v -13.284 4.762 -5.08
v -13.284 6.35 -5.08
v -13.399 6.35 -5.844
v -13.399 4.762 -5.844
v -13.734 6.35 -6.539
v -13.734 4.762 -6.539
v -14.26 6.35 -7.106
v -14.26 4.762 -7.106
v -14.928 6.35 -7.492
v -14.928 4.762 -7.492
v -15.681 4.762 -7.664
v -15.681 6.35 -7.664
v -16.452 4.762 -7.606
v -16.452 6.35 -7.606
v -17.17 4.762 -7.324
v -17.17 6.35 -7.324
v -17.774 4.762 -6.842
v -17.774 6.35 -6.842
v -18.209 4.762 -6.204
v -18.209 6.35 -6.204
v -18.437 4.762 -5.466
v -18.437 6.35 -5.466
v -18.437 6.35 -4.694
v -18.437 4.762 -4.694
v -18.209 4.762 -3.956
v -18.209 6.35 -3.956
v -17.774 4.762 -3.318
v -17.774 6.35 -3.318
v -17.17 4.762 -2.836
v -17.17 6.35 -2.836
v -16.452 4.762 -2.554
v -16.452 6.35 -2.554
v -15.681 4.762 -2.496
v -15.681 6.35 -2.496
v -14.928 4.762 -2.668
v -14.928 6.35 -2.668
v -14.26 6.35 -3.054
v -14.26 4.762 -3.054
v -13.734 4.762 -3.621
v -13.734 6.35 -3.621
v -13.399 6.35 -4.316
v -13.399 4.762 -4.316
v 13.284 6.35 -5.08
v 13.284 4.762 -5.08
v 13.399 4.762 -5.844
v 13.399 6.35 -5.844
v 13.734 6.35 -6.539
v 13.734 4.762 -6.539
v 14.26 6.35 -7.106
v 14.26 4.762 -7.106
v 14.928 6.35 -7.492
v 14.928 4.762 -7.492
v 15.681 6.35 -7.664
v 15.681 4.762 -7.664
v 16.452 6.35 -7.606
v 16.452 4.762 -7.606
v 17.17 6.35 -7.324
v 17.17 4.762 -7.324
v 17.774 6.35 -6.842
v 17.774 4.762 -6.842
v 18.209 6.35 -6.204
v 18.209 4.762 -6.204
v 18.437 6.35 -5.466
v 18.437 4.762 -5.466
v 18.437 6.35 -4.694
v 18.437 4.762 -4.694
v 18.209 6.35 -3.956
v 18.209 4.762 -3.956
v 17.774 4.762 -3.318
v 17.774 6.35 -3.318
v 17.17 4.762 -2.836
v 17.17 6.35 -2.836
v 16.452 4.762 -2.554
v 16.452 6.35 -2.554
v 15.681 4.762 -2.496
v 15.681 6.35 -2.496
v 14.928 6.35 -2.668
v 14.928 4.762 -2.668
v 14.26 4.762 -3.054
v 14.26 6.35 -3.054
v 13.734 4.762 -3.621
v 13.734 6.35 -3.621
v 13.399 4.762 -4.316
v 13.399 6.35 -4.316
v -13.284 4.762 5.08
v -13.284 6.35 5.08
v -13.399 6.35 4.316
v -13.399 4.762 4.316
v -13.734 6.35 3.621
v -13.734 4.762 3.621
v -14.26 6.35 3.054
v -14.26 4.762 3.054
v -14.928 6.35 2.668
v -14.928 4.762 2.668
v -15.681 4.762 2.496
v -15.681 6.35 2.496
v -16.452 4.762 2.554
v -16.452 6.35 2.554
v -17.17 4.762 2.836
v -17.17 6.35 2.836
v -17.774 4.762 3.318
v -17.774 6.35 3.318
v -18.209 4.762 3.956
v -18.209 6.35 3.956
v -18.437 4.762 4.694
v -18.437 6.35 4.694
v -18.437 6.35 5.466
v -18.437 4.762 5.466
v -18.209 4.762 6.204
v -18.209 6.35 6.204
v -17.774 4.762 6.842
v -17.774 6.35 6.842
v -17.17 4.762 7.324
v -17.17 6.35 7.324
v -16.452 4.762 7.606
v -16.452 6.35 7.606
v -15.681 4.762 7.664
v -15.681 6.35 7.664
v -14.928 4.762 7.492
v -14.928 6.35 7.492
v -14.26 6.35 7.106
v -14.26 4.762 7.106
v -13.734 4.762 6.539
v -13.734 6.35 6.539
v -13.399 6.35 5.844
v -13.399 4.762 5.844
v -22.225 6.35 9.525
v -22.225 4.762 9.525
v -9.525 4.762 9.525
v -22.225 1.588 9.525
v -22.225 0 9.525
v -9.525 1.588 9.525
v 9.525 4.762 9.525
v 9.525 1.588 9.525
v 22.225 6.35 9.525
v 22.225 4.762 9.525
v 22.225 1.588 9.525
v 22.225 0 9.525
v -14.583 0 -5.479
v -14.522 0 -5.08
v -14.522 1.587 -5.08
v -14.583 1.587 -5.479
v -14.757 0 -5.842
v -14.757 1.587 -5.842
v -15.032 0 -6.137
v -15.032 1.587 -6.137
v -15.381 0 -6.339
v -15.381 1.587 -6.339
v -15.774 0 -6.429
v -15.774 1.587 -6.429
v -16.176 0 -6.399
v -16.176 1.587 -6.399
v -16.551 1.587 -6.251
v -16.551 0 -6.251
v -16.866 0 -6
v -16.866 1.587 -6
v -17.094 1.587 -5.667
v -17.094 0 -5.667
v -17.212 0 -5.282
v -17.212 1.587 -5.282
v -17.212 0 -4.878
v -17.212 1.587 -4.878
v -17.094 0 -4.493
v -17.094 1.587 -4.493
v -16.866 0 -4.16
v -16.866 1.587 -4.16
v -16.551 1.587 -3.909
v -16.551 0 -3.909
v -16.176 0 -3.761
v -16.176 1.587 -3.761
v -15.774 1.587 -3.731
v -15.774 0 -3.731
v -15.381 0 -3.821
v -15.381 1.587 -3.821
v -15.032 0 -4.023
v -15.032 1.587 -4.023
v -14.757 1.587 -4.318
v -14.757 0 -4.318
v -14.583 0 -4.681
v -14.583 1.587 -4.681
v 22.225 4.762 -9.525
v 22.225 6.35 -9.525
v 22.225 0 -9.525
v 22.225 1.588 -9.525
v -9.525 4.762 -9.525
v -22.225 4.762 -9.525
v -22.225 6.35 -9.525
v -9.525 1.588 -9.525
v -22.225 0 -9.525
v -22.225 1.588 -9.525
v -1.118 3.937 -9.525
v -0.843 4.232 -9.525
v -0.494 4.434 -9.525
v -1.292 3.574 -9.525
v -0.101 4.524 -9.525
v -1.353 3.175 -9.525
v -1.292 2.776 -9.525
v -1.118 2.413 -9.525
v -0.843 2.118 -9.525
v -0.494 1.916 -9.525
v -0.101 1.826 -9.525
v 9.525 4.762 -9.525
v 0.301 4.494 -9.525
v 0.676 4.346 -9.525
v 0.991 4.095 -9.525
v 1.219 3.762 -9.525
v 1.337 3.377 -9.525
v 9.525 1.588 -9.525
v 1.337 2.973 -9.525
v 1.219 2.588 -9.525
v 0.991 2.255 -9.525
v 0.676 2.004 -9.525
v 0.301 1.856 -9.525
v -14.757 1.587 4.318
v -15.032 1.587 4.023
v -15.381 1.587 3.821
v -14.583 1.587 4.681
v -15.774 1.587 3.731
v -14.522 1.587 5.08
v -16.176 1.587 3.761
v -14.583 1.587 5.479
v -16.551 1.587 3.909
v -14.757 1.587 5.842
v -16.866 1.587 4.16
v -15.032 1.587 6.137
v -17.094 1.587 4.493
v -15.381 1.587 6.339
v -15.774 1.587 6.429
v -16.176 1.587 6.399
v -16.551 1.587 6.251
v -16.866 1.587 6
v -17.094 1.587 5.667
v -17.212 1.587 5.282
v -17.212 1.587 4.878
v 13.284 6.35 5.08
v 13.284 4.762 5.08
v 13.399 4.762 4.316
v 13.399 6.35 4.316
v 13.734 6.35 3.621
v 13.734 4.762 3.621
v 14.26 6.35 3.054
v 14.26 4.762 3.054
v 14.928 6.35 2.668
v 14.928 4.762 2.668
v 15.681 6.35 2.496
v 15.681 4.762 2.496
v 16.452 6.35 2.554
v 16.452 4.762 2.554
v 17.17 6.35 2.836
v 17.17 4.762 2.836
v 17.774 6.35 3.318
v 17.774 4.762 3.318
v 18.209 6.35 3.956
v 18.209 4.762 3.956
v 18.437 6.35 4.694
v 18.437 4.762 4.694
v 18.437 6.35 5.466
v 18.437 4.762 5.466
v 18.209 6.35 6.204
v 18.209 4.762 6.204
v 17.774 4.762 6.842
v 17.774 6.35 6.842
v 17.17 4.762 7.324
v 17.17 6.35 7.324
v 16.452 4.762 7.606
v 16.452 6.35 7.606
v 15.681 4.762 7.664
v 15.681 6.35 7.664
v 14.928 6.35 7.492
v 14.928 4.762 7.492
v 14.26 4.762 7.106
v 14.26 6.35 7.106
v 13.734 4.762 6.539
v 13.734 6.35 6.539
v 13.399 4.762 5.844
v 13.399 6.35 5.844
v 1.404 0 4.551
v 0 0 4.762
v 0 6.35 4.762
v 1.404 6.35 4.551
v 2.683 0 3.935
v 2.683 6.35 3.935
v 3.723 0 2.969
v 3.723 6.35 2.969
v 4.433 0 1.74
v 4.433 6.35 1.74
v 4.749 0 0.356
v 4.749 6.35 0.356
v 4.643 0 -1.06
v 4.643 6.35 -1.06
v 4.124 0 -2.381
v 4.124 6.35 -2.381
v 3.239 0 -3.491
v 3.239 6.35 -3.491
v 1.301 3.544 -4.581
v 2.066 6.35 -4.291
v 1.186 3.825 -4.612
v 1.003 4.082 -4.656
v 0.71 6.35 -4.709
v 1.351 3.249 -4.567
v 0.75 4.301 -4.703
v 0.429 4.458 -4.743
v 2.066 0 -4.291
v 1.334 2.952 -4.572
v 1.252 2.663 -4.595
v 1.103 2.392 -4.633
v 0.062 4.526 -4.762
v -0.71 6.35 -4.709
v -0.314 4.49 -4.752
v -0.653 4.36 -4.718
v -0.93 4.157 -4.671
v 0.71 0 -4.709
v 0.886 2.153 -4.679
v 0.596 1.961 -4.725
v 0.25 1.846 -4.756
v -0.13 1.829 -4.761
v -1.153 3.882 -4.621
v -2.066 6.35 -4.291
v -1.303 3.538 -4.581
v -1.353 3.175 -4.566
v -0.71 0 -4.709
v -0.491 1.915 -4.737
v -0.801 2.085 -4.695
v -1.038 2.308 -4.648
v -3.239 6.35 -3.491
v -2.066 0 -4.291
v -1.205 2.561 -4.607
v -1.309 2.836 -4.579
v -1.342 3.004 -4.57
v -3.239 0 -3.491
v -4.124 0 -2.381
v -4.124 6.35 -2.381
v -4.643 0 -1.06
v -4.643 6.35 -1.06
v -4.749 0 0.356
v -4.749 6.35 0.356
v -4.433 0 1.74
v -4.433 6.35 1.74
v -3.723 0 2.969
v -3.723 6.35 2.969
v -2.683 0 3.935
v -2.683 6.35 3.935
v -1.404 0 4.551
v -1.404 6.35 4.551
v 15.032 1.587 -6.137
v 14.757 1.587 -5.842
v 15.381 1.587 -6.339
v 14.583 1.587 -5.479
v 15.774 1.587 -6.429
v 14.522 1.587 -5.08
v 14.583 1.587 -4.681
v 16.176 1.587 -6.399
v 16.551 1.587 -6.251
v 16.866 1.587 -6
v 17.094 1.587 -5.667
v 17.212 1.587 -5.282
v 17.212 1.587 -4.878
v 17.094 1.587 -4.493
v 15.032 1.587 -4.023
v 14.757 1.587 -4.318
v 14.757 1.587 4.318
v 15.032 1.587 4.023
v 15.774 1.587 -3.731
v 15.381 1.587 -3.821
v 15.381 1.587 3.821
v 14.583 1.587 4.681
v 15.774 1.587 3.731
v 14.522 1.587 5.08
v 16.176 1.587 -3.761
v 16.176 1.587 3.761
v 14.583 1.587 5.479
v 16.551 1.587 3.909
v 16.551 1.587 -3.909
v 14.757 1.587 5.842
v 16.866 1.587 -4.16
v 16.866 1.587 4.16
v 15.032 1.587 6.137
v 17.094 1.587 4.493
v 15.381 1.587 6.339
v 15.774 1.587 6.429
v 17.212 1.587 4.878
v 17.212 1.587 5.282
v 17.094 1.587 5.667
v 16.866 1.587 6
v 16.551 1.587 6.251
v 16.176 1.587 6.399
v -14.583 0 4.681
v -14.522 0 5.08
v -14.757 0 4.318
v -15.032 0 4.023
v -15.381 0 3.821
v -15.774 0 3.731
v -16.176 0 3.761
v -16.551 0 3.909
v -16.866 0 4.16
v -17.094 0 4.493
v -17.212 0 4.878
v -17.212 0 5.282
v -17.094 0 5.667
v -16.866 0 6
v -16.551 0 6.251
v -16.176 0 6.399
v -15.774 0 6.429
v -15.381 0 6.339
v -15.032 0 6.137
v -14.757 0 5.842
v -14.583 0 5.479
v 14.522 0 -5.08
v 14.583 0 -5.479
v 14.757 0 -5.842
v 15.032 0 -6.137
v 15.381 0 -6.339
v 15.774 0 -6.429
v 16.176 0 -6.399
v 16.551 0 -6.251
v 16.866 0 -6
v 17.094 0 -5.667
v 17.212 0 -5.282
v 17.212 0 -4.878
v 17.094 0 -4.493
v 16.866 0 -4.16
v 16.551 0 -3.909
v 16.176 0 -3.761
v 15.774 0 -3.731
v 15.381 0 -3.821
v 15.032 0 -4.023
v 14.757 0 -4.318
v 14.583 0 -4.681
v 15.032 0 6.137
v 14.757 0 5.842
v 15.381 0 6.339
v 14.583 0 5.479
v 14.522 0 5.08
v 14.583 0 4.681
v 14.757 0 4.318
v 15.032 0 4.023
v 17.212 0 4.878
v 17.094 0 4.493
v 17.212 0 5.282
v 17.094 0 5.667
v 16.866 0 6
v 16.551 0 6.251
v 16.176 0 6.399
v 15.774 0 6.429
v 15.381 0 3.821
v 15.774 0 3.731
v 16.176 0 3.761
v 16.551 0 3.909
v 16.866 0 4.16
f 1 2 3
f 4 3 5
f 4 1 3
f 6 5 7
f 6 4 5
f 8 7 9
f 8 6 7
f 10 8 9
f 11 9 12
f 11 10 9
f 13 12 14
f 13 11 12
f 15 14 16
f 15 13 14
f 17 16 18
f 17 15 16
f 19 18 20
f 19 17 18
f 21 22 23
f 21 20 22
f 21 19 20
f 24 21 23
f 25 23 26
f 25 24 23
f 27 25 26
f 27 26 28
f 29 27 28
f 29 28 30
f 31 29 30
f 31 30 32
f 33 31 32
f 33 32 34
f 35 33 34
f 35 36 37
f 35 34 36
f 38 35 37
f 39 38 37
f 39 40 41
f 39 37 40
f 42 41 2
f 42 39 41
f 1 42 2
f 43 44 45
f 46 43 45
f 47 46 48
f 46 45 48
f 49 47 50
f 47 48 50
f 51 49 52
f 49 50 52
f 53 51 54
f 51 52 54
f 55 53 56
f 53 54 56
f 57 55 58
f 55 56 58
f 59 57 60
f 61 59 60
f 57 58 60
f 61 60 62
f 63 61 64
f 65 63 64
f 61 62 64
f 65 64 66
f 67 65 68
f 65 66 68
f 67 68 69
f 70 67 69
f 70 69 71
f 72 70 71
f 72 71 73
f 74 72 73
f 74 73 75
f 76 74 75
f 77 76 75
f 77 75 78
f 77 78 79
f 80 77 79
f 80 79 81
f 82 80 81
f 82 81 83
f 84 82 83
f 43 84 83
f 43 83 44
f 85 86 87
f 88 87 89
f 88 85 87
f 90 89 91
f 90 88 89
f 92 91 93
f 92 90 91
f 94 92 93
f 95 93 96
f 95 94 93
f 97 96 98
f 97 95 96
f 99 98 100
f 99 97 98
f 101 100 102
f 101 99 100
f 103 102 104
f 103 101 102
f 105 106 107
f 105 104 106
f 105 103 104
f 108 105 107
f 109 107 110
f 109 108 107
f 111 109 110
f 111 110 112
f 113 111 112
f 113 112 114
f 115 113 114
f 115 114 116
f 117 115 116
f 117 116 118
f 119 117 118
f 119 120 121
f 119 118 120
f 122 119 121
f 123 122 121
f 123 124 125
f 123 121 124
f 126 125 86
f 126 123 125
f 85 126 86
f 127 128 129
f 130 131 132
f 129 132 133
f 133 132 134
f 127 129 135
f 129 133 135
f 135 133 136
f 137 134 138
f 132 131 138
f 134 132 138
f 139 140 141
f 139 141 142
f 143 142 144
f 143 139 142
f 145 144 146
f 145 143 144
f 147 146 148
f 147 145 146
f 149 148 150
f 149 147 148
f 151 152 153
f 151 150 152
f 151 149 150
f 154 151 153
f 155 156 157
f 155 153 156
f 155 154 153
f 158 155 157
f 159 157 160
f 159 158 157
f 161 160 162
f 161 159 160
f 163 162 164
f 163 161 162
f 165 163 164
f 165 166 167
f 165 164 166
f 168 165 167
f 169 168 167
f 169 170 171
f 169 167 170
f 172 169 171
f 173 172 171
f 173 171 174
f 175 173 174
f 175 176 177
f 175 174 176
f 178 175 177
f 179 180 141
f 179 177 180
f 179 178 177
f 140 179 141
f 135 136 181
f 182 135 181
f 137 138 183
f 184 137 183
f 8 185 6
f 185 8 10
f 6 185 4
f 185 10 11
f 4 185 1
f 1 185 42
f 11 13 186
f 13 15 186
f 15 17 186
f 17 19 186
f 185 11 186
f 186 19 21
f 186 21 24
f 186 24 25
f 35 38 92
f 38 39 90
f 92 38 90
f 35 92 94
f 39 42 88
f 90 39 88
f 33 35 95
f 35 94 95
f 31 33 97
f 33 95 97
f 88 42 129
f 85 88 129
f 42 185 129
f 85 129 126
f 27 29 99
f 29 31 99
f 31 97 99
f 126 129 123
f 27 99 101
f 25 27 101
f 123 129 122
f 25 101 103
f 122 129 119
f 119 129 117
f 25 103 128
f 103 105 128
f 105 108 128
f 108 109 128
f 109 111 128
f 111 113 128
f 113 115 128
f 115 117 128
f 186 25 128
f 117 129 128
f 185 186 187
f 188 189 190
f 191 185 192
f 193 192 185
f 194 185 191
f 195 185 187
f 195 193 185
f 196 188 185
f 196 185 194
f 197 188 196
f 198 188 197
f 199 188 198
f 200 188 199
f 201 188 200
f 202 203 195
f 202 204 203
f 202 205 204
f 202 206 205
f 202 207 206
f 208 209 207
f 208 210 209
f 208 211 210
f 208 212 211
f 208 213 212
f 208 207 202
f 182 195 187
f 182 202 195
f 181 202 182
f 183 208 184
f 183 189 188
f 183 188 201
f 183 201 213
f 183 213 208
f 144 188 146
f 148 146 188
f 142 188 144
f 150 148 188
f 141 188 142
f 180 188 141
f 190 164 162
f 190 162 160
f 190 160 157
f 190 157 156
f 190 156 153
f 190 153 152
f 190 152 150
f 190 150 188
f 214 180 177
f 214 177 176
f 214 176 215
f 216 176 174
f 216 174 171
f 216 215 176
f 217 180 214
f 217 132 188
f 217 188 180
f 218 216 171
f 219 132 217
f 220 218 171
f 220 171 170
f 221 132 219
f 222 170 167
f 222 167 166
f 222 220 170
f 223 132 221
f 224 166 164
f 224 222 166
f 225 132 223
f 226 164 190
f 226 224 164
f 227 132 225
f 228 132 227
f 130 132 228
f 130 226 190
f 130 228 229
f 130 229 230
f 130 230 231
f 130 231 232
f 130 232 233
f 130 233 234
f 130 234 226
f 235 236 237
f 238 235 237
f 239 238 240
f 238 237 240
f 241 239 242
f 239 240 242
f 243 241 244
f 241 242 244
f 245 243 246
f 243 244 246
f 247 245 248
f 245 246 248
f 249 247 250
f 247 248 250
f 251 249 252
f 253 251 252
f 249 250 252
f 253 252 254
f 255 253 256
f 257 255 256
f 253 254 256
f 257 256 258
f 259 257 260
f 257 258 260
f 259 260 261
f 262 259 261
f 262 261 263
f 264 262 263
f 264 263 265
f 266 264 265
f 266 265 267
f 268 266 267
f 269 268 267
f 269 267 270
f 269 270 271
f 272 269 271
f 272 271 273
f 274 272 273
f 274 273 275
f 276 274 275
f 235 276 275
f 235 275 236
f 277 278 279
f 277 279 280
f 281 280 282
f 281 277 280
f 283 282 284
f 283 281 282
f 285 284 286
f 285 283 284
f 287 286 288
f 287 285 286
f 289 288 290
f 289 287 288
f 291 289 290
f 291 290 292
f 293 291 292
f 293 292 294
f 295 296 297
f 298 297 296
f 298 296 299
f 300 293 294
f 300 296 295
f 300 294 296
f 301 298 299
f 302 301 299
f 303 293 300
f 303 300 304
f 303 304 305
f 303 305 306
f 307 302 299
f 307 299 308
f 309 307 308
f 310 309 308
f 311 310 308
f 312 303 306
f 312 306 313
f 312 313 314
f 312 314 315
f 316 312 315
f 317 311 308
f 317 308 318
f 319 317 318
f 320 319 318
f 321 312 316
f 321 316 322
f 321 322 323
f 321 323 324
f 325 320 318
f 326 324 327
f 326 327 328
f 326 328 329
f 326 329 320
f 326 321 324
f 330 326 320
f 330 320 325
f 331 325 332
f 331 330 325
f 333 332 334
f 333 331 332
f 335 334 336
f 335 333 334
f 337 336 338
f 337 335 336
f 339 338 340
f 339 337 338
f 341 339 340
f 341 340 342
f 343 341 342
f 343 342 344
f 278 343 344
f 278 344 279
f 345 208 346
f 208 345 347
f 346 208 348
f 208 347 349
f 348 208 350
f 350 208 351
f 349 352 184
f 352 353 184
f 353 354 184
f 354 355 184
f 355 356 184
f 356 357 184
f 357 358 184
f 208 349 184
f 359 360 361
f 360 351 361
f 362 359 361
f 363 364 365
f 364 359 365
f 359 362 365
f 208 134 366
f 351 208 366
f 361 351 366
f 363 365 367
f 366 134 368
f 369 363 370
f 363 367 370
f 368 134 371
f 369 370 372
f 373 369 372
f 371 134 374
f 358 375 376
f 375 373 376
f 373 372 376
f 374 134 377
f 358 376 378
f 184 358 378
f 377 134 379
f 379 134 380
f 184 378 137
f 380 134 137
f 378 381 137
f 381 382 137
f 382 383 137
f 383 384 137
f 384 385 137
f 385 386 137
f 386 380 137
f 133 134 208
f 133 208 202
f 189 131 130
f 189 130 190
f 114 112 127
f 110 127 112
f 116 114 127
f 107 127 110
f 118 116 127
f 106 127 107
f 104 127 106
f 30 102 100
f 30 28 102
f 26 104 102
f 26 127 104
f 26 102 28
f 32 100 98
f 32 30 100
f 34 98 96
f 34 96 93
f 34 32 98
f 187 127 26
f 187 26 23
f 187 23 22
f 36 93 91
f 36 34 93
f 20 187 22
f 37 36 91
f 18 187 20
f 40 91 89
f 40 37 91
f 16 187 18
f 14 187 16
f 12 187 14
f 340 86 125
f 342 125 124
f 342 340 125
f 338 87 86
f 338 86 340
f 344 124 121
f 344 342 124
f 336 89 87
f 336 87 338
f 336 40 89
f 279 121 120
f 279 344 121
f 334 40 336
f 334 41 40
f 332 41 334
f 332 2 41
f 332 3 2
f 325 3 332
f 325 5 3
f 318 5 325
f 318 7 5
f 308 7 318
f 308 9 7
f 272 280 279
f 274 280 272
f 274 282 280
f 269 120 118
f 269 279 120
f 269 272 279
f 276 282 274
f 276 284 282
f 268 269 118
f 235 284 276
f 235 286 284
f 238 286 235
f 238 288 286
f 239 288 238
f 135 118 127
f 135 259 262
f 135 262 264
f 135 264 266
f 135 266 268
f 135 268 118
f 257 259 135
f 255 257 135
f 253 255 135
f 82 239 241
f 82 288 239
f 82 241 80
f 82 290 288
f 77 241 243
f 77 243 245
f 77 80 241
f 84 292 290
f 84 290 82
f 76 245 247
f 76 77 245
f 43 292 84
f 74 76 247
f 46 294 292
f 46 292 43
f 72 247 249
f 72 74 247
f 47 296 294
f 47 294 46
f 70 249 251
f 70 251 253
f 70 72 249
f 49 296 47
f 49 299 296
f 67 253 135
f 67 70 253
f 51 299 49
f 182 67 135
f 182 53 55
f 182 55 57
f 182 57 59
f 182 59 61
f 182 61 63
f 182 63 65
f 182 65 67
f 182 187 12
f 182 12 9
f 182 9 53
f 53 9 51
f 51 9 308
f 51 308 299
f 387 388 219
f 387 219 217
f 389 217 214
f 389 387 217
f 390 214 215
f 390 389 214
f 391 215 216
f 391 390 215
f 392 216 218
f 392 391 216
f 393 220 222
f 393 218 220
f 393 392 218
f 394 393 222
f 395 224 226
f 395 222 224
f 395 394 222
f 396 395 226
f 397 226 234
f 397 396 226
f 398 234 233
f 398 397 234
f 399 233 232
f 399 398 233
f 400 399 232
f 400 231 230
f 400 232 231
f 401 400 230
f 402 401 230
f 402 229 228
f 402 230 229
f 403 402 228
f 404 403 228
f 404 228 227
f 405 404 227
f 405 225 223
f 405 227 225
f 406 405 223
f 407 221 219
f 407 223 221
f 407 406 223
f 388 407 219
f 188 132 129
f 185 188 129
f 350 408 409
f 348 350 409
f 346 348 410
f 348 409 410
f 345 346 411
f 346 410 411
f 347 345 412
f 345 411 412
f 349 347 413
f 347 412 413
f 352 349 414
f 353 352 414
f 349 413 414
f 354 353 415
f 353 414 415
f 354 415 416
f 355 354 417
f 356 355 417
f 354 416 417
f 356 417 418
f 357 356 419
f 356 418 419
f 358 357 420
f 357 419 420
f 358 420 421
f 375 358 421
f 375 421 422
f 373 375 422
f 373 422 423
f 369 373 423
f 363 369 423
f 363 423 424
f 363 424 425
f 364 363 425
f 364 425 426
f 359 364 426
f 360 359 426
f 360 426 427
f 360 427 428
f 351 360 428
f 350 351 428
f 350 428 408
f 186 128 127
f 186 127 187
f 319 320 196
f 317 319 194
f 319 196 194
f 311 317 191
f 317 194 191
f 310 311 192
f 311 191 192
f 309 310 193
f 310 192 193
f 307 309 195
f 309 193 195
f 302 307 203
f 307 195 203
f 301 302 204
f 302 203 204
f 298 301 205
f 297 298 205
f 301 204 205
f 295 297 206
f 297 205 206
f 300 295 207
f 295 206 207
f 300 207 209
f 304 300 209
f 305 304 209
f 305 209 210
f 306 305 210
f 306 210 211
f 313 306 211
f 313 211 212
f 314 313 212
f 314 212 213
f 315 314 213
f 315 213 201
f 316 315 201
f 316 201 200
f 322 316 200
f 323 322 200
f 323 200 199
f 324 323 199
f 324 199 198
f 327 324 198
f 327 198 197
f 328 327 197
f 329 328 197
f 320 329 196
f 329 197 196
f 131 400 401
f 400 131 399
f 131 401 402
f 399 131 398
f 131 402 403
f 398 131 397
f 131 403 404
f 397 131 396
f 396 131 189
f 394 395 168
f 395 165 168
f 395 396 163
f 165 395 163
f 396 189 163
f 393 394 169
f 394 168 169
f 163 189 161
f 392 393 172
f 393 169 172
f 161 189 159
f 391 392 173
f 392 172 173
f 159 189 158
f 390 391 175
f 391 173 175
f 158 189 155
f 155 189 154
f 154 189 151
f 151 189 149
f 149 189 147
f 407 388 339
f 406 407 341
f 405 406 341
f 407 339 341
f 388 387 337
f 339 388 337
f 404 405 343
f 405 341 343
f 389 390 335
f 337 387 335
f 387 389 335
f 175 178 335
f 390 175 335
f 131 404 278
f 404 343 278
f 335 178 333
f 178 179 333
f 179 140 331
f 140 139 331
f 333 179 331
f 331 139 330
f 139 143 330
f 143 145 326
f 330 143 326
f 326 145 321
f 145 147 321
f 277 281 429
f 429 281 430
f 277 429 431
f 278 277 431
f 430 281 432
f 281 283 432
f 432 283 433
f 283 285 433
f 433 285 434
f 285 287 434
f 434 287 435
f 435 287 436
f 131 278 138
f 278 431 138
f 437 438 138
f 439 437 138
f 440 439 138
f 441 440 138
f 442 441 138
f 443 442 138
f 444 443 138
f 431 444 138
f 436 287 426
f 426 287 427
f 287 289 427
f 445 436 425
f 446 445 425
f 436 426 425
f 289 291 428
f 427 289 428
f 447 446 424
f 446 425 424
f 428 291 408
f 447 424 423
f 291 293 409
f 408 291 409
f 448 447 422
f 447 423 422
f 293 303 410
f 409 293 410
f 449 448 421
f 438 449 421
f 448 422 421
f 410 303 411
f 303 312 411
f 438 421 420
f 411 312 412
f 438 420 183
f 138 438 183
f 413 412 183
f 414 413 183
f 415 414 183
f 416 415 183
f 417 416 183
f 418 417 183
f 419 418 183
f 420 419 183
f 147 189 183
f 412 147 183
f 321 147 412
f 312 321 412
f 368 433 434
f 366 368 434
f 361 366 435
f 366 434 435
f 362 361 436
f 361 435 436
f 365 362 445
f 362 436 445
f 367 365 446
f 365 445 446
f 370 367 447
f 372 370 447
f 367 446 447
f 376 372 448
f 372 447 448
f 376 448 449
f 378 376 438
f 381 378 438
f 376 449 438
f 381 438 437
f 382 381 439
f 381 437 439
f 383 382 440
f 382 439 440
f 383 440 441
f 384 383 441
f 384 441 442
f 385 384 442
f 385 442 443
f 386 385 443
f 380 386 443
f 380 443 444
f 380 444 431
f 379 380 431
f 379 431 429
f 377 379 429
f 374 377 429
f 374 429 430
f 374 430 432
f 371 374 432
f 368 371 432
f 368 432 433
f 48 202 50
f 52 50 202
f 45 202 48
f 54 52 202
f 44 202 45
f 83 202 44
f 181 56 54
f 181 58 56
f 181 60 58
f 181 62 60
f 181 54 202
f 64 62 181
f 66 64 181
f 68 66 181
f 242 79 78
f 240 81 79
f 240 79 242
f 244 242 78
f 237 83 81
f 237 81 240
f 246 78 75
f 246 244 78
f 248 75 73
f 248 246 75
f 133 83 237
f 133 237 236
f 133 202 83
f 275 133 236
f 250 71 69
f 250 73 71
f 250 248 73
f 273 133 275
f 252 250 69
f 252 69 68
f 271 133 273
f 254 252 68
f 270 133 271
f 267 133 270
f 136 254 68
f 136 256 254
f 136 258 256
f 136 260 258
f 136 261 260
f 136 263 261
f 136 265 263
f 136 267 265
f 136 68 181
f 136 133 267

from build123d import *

# Parameters (mm, degrees)
SKETCH1_W                      = 44.45
SKETCH1_H                      = 19.05
SKETCH1_R                      = 4.7625
BOSS_EXTRUDE1_DEPTH            = 6.35
F_6_32_TAPPED_HOLE1_REACH      = 31.953
F_6_32_TAPPED_HOLE1_BORE_R     = 1.35255
SKETCH15_W                     = 12.7
SKETCH15_H                     = 3.175
CUT_EXTRUDE1_DEPTH             = 30.952890179
F_6_0_204_DIAMETER_HOLE1_D     = 5.1816
F_6_0_204_DIAMETER_HOLE1_DEPTH = 1.5875
F_6_32_TAPPED_HOLE4_D          = 2.7051


with BuildPart() as part:
    # Sketch1 → Boss-Extrude1 (new body)
    with BuildSketch(Plane(origin=(0, 0, 0), x_dir=(1, 0, 0), z_dir=(0, 1, 0))):
        Rectangle(SKETCH1_W, SKETCH1_H)
        with Locations(Location((0, 0, 0), (0, 0, 270))):
            Circle(SKETCH1_R, mode=Mode.SUBTRACT)
    extrude(amount=BOSS_EXTRUDE1_DEPTH)

    # #6-32 Tapped Hole1 bore → #6-32 Tapped Hole1 (cut, up to next)
    with BuildSketch(Plane(origin=(0, 0, -9.525), x_dir=(-1, 0, 0), z_dir=(0, 0, -1)), mode=Mode.PRIVATE) as f_6_32_tapped_hole1_sk1:
        with Locations((0, 3.175)):
            Circle(F_6_32_TAPPED_HOLE1_BORE_R)
    f_6_32_tapped_hole1_tool1 = extrude(f_6_32_tapped_hole1_sk1.sketch, amount=-F_6_32_TAPPED_HOLE1_REACH, mode=Mode.PRIVATE) & part.part
    add(f_6_32_tapped_hole1_tool1.solids().sort_by_distance((0, 3.175, -9.525))[0], mode=Mode.SUBTRACT)

    # Sketch15 → Cut-Extrude1 (cut, through all)
    with BuildSketch(Plane.XY.offset(9.525)):
        with Locations((15.875, 3.175)):
            Rectangle(SKETCH15_W, SKETCH15_H)
    cut_extrude1 = extrude(amount=-CUT_EXTRUDE1_DEPTH, mode=Mode.SUBTRACT)

    # #6 (0.204) Diameter Hole1
    with Locations(Plane(origin=(0, 6.35, 0), x_dir=(1, 0, 0), z_dir=(0, 1, 0))):
        with Locations((15.875, 5.08), (15.875, -5.08)):
            f_6_0_204_diameter_hole1 = Hole(F_6_0_204_DIAMETER_HOLE1_D / 2, depth=F_6_0_204_DIAMETER_HOLE1_DEPTH)

    # #6-32 Tapped Hole4 (through all)
    with Locations(Plane(origin=(0, 1.5875, 0), x_dir=(1, 0, 0), z_dir=(0, 1, 0))):
        with Locations((15.875, 5.08), (15.875, -5.08)):
            f_6_32_tapped_hole4 = Hole(F_6_32_TAPPED_HOLE4_D / 2)

    # Mirror3: Cut-Extrude1, #6 (0.204) Diameter Hole1, #6-32 Tapped Hole4 across plane
    add(cut_extrude1.mirror(Plane(origin=(0, 0, 0), x_dir=(0, 0, 1), z_dir=(1, 0, 0))), mode=Mode.SUBTRACT)
    add(f_6_0_204_diameter_hole1.mirror(Plane(origin=(0, 0, 0), x_dir=(0, 0, 1), z_dir=(1, 0, 0))), mode=Mode.SUBTRACT)
    add(f_6_32_tapped_hole4.mirror(Plane(origin=(0, 0, 0), x_dir=(0, 0, 1), z_dir=(1, 0, 0))), mode=Mode.SUBTRACT)


solid = part.part
